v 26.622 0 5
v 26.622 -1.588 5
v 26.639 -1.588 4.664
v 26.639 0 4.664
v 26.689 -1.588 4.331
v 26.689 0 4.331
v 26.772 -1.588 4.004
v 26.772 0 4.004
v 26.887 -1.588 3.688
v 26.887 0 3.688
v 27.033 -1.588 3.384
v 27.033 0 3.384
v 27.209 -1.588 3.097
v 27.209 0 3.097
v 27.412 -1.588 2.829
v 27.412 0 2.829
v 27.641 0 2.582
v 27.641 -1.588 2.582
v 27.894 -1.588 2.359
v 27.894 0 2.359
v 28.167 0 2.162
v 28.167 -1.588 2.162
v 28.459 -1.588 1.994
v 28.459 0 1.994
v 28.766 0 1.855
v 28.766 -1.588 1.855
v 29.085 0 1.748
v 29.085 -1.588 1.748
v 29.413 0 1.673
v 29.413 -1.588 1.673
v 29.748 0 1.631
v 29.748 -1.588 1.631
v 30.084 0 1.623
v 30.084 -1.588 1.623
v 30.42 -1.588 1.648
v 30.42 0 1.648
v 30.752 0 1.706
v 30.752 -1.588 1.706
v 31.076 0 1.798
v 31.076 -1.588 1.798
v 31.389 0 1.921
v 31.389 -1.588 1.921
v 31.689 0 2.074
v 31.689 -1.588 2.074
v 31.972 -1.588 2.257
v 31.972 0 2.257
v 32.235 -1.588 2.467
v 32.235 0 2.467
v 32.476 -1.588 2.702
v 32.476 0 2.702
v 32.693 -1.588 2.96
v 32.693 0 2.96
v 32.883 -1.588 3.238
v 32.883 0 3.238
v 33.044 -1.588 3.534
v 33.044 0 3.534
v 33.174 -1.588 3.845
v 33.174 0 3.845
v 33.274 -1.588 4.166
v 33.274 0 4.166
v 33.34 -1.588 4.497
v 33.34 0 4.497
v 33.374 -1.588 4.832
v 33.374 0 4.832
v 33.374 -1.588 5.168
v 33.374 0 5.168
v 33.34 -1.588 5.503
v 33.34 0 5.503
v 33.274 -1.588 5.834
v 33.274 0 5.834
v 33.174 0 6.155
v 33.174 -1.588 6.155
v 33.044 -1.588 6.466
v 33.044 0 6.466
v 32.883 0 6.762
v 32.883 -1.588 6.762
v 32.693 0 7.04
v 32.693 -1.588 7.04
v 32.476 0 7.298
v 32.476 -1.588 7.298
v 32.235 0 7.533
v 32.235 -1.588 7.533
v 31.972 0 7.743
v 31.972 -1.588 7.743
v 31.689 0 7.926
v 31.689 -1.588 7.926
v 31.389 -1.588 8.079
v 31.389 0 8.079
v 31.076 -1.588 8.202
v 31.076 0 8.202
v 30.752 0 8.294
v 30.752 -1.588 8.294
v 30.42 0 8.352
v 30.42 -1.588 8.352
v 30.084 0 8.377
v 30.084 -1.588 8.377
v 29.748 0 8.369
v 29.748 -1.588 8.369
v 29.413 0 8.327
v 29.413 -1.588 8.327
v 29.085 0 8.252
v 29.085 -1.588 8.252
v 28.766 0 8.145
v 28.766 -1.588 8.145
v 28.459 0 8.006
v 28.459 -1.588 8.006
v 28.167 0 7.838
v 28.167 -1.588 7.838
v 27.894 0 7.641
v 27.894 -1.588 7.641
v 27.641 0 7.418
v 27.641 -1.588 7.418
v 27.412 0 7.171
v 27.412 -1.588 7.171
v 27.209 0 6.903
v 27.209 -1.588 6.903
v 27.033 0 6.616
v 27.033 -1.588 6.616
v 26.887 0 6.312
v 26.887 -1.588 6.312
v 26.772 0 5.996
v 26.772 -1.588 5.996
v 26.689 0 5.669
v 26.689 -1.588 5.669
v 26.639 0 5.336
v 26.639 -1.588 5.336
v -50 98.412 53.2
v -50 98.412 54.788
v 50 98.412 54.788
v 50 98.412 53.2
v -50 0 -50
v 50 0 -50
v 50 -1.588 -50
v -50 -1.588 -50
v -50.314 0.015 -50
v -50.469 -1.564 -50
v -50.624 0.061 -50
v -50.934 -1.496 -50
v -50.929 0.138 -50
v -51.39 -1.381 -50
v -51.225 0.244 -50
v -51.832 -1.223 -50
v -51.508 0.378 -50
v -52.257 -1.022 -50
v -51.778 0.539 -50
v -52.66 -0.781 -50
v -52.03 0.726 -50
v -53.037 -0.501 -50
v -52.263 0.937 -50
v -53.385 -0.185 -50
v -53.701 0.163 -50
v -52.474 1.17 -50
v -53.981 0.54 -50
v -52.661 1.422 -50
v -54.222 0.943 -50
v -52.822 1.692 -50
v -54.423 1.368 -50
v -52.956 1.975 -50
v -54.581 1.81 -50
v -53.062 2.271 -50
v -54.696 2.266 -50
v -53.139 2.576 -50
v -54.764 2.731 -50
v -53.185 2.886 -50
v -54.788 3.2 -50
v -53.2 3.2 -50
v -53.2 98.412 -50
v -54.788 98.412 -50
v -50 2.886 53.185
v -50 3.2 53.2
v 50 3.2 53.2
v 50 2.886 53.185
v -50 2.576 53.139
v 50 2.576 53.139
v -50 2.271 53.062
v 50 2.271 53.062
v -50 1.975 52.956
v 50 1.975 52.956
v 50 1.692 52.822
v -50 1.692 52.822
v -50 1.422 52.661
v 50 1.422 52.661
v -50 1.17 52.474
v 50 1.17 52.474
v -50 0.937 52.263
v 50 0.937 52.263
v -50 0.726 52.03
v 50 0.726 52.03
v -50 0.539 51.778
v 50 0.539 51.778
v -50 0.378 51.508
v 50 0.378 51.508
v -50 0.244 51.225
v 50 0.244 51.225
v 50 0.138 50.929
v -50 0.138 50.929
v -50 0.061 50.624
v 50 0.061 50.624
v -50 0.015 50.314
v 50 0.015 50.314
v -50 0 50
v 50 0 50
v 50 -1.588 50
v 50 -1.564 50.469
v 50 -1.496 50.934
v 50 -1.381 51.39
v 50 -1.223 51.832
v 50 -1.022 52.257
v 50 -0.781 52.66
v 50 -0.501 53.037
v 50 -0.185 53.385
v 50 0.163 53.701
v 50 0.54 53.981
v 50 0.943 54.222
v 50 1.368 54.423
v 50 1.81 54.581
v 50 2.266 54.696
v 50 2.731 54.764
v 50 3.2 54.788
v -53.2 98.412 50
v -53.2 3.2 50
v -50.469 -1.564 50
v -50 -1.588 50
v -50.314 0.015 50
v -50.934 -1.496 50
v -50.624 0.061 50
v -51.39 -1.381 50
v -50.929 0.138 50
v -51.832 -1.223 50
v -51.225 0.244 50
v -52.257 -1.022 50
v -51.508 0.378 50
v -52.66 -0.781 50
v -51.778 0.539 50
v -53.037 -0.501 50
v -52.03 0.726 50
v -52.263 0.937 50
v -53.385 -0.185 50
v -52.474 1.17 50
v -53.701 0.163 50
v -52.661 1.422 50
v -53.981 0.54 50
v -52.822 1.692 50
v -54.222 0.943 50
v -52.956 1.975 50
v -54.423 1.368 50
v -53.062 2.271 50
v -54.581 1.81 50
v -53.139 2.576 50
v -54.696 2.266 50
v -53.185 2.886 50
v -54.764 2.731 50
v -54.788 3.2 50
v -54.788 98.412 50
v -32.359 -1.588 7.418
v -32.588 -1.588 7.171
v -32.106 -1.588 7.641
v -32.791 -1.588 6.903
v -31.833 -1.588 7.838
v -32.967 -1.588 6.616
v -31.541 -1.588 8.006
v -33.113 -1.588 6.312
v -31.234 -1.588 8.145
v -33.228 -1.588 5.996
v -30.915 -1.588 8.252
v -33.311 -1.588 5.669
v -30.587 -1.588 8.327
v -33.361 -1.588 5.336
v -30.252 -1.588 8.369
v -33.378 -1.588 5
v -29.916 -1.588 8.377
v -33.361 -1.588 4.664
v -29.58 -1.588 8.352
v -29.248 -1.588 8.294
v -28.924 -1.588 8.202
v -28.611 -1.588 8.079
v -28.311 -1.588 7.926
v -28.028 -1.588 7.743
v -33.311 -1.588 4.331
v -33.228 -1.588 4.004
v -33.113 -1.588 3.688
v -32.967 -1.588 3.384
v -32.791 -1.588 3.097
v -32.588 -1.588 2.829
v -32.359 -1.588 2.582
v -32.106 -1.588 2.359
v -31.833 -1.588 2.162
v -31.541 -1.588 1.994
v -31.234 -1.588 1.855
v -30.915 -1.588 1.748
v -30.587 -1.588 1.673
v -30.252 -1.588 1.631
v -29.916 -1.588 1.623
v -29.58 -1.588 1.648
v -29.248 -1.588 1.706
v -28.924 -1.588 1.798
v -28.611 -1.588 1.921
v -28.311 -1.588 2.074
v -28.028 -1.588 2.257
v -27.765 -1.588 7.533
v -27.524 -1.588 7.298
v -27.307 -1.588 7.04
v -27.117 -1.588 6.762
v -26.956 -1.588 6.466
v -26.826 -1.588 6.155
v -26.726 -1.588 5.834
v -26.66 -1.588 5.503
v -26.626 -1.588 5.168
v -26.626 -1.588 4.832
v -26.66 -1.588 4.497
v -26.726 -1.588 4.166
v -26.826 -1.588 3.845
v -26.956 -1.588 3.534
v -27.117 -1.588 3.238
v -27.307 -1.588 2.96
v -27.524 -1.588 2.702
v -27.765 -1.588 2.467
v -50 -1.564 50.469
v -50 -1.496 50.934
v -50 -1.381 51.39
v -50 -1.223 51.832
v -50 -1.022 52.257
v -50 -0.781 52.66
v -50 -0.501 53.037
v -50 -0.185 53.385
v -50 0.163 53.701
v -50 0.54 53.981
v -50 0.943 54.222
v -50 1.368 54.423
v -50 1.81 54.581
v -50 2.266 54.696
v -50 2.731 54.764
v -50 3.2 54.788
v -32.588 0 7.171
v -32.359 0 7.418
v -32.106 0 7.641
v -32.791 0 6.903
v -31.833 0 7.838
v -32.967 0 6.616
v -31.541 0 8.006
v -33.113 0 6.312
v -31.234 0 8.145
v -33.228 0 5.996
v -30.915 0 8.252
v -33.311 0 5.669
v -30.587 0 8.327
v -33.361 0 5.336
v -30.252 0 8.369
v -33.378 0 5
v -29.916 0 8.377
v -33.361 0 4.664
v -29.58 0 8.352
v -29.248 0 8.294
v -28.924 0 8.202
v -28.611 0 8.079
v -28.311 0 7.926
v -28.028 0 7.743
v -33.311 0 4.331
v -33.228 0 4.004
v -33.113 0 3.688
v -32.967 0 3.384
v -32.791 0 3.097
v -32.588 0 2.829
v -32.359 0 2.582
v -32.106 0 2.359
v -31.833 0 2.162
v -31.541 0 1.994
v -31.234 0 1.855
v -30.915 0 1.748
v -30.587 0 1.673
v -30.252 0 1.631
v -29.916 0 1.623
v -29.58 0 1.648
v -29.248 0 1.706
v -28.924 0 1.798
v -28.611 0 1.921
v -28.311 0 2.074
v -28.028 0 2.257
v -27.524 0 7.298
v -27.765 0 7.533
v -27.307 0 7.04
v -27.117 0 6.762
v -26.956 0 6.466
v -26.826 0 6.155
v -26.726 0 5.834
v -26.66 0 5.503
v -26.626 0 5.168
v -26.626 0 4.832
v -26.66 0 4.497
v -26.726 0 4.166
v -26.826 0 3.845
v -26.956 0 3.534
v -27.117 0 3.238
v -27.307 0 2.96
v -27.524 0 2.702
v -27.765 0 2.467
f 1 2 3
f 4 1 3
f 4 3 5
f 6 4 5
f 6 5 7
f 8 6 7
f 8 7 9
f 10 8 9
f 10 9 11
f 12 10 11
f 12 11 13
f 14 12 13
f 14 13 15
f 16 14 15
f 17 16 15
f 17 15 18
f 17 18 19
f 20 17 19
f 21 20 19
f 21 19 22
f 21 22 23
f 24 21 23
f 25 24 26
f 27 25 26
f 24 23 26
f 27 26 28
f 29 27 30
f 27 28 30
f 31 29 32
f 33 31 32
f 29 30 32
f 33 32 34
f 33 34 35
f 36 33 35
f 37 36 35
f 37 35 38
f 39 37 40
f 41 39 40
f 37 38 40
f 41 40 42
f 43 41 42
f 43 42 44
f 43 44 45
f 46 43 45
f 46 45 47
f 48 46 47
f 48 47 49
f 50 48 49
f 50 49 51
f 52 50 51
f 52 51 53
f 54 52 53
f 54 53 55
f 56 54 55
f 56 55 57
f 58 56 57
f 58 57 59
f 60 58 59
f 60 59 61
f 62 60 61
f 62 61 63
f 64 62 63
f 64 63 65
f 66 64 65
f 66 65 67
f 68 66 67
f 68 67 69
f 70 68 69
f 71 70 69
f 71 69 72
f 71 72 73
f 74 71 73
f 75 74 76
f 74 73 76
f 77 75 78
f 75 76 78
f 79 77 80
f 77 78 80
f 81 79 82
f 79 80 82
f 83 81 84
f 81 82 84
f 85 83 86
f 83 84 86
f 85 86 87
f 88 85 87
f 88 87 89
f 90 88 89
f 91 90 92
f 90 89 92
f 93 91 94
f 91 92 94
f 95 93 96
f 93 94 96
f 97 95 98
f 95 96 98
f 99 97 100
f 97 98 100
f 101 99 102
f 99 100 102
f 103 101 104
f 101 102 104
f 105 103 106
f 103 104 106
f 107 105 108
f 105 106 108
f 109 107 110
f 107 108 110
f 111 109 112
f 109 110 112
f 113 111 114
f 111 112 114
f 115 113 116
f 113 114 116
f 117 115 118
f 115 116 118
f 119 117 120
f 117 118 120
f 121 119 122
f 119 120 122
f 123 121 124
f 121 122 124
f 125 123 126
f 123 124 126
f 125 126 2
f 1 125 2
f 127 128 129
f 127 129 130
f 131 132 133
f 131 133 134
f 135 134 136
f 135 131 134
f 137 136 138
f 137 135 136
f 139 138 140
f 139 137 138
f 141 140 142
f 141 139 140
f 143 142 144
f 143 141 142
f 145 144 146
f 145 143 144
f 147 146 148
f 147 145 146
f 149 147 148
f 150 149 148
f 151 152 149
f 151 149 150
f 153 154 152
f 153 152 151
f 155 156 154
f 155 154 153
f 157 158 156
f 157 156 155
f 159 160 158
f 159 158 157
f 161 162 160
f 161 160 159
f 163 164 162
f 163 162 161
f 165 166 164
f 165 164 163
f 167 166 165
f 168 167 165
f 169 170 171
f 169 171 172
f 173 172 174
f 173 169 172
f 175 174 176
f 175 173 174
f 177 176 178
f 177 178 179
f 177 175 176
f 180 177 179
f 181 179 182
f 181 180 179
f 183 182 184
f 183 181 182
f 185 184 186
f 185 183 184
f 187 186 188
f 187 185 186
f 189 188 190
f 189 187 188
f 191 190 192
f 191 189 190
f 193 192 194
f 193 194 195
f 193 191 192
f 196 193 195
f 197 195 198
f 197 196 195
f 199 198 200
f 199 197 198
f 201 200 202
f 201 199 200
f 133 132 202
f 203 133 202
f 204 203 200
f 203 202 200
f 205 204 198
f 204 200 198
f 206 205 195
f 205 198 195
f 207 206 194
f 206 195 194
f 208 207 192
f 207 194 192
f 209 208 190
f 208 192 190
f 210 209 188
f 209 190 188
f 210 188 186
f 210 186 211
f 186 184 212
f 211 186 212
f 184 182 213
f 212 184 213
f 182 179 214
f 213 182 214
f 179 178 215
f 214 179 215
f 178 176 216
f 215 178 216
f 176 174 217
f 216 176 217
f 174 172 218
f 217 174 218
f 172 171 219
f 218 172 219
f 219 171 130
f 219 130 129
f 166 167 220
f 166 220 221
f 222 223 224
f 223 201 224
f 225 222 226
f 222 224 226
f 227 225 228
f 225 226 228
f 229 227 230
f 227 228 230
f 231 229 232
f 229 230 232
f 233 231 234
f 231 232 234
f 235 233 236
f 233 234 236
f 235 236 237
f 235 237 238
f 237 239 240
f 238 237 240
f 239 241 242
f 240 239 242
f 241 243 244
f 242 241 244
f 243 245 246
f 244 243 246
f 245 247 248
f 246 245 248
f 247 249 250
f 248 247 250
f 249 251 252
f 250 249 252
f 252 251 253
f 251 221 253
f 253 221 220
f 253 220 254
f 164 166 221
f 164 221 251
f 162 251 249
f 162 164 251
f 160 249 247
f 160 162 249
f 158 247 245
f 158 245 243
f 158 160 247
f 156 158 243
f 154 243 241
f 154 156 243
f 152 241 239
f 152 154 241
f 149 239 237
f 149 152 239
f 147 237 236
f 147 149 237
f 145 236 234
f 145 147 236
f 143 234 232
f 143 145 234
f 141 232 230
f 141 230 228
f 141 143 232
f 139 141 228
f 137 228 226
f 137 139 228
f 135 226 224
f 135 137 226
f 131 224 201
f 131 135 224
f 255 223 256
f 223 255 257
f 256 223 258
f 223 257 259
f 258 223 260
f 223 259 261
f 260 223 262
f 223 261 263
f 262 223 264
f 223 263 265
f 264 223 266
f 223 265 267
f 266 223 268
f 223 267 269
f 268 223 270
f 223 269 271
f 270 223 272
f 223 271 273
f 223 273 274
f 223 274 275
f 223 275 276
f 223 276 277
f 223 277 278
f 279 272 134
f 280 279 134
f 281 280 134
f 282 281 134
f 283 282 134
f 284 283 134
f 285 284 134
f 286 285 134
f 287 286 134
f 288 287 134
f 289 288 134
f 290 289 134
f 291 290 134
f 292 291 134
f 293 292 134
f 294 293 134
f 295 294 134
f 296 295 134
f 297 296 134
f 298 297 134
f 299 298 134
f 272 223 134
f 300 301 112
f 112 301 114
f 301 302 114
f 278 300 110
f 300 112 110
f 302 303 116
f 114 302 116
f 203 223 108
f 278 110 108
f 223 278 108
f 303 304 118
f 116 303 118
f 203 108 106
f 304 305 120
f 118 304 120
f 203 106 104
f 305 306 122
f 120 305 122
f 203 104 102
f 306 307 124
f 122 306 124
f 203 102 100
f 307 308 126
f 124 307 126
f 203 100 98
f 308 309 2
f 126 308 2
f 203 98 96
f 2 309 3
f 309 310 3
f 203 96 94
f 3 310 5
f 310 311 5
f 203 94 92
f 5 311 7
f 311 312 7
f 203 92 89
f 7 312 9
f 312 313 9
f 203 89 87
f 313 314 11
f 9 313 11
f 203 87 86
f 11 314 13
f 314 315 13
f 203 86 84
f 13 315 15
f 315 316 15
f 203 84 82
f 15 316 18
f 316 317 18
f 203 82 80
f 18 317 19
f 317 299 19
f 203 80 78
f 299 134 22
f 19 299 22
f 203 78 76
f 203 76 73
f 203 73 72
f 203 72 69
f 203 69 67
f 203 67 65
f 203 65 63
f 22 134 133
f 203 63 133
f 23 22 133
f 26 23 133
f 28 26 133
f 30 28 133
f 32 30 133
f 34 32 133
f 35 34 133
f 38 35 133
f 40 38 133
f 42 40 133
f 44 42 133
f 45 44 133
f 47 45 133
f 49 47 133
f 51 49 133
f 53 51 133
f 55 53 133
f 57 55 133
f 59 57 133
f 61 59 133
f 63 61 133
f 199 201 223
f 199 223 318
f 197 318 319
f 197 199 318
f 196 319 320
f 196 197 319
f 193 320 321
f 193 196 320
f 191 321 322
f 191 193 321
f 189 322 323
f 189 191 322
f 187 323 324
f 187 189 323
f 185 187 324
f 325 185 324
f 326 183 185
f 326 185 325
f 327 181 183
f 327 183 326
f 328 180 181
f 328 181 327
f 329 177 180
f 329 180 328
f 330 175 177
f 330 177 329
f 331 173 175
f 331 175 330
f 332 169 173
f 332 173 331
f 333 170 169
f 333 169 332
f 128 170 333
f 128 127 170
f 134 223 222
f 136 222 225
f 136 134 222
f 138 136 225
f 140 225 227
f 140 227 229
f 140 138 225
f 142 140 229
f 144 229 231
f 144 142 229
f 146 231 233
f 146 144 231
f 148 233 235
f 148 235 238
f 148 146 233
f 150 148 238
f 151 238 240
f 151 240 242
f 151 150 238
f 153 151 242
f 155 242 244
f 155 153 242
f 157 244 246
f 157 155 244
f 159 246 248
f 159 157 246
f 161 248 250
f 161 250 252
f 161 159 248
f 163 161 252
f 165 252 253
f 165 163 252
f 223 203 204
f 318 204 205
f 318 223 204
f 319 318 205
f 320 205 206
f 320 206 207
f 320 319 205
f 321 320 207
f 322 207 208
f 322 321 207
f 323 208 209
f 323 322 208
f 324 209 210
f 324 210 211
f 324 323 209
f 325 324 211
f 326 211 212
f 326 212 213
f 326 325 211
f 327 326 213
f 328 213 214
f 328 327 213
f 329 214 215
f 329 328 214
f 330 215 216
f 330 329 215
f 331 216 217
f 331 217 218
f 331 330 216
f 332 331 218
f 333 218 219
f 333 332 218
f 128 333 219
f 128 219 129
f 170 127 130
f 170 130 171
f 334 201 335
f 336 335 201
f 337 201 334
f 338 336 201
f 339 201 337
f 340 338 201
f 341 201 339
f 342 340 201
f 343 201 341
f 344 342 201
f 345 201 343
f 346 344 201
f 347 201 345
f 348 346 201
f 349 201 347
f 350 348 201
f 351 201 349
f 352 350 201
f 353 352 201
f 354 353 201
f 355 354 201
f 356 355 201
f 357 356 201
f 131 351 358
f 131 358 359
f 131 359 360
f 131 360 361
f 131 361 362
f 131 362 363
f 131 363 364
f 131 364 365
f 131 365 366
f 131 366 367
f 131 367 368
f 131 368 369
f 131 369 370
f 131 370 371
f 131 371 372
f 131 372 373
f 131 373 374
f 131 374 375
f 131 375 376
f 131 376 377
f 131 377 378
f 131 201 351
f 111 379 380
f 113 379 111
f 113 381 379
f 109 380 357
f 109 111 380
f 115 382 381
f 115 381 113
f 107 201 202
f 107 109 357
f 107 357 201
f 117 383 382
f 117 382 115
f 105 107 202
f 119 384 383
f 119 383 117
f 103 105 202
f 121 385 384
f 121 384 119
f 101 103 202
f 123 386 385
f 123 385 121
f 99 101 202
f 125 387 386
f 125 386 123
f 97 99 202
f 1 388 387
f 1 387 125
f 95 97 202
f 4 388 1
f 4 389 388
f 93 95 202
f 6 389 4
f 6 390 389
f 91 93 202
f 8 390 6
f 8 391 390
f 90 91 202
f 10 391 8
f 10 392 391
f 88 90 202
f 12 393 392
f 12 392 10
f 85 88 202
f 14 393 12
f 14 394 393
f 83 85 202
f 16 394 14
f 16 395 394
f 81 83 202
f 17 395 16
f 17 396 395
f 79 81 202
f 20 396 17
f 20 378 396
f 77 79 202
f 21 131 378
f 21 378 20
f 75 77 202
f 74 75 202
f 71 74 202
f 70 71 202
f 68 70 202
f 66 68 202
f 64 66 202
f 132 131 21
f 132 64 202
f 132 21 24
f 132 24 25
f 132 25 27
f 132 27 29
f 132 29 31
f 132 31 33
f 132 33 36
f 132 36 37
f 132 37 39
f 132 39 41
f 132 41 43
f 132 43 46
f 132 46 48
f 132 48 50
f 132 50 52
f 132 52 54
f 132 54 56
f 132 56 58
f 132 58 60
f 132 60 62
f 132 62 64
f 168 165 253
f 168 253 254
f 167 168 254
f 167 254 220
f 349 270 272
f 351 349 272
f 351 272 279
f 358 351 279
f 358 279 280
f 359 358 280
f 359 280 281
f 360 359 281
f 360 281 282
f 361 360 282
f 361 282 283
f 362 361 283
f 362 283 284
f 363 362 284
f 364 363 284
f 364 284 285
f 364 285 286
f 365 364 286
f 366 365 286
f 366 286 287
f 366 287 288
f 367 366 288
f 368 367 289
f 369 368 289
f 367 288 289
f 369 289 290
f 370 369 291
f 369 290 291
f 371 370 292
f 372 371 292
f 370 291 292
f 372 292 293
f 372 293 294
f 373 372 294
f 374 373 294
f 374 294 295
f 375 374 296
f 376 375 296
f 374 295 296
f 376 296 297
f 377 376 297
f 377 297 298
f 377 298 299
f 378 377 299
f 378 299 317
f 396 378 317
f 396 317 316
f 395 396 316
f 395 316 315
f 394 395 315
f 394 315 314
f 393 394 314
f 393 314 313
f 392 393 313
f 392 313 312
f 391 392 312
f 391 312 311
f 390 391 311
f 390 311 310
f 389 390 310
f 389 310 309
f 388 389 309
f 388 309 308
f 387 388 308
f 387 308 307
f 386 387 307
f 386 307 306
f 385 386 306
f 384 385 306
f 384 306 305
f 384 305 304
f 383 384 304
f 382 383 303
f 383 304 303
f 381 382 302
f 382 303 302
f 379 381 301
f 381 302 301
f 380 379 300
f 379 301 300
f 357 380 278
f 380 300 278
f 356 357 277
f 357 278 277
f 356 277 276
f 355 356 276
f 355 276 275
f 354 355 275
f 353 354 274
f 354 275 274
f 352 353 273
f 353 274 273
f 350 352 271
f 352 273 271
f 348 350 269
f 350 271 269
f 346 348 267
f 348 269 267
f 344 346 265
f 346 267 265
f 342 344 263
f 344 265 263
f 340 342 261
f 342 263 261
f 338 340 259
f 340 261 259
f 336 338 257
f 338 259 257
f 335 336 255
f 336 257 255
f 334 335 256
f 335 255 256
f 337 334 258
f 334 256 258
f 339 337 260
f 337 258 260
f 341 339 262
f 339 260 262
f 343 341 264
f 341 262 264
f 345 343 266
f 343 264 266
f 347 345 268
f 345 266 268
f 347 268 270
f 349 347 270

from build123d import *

# Parameters (mm, degrees)
SKETCH1_W               = 100
SKETCH1_H               = 100
BASE_FLANGE1_DEPTH      = 1.5875
EDGE_FLANGE1_DEPTH      = 100
EDGE_FLANGE2_DEPTH      = 100
F_1_4_CLEARANCE_HOLE1_D = 6.7564


# Sheet-metal steps are written as plain solids
with BuildPart() as part:
    # Sketch1 → Base-Flange1 (new body)
    with BuildSketch(Plane(origin=(0, 0, 0), x_dir=(1, 0, 0), z_dir=(0, 1, 0))):
        Rectangle(SKETCH1_W, SKETCH1_H)
    extrude(amount=-BASE_FLANGE1_DEPTH)

    # Edge-Flange1 section (across the edge) → Edge-Flange1 (add)
    with BuildSketch(Plane(origin=(-53.2, 0, -50), x_dir=(1, 0, 0), z_dir=(0, 0, 1))):
        with BuildLine():
            Line((-1.5875, 3.2), (-1.5875, 98.4125))
            Line((-1.5875, 98.4125), (0, 98.4125))
            Line((0, 98.4125), (0, 3.2))
            ThreePointArc((0, 3.2), (0.9372583, 0.9372583), (3.2, 0))
            Line((3.2, 0), (3.2, -1.5875))
            ThreePointArc((3.2, -1.5875), (-0.185273715, -0.185273715), (-1.5875, 3.2))
        make_face()
    extrude(amount=EDGE_FLANGE1_DEPTH)

    # Edge-Flange2 section (across the edge) → Edge-Flange2 (add)
    with BuildSketch(Plane(origin=(-50, 0, 53.2), x_dir=(0, 0, -1), z_dir=(1, 0, 0))):
        with BuildLine():
            Line((-1.5875, 3.2), (-1.5875, 98.4125))
            Line((-1.5875, 98.4125), (0, 98.4125))
            Line((0, 98.4125), (0, 3.2))
            ThreePointArc((0, 3.2), (0.9372583, 0.9372583), (3.2, 0))
            Line((3.2, 0), (3.2, -1.5875))
            ThreePointArc((3.2, -1.5875), (-0.185273715, -0.185273715), (-1.5875, 3.2))
        make_face()
    extrude(amount=EDGE_FLANGE2_DEPTH)

    # 1/4 Clearance Hole1 (through all)
    with Locations(Plane(origin=(0, 0, 0), x_dir=(1, 0, 0), z_dir=(0, 1, 0))):
        with Locations((-30, -5), (30, -5)):
            Hole(F_1_4_CLEARANCE_HOLE1_D / 2)


solid = part.part
